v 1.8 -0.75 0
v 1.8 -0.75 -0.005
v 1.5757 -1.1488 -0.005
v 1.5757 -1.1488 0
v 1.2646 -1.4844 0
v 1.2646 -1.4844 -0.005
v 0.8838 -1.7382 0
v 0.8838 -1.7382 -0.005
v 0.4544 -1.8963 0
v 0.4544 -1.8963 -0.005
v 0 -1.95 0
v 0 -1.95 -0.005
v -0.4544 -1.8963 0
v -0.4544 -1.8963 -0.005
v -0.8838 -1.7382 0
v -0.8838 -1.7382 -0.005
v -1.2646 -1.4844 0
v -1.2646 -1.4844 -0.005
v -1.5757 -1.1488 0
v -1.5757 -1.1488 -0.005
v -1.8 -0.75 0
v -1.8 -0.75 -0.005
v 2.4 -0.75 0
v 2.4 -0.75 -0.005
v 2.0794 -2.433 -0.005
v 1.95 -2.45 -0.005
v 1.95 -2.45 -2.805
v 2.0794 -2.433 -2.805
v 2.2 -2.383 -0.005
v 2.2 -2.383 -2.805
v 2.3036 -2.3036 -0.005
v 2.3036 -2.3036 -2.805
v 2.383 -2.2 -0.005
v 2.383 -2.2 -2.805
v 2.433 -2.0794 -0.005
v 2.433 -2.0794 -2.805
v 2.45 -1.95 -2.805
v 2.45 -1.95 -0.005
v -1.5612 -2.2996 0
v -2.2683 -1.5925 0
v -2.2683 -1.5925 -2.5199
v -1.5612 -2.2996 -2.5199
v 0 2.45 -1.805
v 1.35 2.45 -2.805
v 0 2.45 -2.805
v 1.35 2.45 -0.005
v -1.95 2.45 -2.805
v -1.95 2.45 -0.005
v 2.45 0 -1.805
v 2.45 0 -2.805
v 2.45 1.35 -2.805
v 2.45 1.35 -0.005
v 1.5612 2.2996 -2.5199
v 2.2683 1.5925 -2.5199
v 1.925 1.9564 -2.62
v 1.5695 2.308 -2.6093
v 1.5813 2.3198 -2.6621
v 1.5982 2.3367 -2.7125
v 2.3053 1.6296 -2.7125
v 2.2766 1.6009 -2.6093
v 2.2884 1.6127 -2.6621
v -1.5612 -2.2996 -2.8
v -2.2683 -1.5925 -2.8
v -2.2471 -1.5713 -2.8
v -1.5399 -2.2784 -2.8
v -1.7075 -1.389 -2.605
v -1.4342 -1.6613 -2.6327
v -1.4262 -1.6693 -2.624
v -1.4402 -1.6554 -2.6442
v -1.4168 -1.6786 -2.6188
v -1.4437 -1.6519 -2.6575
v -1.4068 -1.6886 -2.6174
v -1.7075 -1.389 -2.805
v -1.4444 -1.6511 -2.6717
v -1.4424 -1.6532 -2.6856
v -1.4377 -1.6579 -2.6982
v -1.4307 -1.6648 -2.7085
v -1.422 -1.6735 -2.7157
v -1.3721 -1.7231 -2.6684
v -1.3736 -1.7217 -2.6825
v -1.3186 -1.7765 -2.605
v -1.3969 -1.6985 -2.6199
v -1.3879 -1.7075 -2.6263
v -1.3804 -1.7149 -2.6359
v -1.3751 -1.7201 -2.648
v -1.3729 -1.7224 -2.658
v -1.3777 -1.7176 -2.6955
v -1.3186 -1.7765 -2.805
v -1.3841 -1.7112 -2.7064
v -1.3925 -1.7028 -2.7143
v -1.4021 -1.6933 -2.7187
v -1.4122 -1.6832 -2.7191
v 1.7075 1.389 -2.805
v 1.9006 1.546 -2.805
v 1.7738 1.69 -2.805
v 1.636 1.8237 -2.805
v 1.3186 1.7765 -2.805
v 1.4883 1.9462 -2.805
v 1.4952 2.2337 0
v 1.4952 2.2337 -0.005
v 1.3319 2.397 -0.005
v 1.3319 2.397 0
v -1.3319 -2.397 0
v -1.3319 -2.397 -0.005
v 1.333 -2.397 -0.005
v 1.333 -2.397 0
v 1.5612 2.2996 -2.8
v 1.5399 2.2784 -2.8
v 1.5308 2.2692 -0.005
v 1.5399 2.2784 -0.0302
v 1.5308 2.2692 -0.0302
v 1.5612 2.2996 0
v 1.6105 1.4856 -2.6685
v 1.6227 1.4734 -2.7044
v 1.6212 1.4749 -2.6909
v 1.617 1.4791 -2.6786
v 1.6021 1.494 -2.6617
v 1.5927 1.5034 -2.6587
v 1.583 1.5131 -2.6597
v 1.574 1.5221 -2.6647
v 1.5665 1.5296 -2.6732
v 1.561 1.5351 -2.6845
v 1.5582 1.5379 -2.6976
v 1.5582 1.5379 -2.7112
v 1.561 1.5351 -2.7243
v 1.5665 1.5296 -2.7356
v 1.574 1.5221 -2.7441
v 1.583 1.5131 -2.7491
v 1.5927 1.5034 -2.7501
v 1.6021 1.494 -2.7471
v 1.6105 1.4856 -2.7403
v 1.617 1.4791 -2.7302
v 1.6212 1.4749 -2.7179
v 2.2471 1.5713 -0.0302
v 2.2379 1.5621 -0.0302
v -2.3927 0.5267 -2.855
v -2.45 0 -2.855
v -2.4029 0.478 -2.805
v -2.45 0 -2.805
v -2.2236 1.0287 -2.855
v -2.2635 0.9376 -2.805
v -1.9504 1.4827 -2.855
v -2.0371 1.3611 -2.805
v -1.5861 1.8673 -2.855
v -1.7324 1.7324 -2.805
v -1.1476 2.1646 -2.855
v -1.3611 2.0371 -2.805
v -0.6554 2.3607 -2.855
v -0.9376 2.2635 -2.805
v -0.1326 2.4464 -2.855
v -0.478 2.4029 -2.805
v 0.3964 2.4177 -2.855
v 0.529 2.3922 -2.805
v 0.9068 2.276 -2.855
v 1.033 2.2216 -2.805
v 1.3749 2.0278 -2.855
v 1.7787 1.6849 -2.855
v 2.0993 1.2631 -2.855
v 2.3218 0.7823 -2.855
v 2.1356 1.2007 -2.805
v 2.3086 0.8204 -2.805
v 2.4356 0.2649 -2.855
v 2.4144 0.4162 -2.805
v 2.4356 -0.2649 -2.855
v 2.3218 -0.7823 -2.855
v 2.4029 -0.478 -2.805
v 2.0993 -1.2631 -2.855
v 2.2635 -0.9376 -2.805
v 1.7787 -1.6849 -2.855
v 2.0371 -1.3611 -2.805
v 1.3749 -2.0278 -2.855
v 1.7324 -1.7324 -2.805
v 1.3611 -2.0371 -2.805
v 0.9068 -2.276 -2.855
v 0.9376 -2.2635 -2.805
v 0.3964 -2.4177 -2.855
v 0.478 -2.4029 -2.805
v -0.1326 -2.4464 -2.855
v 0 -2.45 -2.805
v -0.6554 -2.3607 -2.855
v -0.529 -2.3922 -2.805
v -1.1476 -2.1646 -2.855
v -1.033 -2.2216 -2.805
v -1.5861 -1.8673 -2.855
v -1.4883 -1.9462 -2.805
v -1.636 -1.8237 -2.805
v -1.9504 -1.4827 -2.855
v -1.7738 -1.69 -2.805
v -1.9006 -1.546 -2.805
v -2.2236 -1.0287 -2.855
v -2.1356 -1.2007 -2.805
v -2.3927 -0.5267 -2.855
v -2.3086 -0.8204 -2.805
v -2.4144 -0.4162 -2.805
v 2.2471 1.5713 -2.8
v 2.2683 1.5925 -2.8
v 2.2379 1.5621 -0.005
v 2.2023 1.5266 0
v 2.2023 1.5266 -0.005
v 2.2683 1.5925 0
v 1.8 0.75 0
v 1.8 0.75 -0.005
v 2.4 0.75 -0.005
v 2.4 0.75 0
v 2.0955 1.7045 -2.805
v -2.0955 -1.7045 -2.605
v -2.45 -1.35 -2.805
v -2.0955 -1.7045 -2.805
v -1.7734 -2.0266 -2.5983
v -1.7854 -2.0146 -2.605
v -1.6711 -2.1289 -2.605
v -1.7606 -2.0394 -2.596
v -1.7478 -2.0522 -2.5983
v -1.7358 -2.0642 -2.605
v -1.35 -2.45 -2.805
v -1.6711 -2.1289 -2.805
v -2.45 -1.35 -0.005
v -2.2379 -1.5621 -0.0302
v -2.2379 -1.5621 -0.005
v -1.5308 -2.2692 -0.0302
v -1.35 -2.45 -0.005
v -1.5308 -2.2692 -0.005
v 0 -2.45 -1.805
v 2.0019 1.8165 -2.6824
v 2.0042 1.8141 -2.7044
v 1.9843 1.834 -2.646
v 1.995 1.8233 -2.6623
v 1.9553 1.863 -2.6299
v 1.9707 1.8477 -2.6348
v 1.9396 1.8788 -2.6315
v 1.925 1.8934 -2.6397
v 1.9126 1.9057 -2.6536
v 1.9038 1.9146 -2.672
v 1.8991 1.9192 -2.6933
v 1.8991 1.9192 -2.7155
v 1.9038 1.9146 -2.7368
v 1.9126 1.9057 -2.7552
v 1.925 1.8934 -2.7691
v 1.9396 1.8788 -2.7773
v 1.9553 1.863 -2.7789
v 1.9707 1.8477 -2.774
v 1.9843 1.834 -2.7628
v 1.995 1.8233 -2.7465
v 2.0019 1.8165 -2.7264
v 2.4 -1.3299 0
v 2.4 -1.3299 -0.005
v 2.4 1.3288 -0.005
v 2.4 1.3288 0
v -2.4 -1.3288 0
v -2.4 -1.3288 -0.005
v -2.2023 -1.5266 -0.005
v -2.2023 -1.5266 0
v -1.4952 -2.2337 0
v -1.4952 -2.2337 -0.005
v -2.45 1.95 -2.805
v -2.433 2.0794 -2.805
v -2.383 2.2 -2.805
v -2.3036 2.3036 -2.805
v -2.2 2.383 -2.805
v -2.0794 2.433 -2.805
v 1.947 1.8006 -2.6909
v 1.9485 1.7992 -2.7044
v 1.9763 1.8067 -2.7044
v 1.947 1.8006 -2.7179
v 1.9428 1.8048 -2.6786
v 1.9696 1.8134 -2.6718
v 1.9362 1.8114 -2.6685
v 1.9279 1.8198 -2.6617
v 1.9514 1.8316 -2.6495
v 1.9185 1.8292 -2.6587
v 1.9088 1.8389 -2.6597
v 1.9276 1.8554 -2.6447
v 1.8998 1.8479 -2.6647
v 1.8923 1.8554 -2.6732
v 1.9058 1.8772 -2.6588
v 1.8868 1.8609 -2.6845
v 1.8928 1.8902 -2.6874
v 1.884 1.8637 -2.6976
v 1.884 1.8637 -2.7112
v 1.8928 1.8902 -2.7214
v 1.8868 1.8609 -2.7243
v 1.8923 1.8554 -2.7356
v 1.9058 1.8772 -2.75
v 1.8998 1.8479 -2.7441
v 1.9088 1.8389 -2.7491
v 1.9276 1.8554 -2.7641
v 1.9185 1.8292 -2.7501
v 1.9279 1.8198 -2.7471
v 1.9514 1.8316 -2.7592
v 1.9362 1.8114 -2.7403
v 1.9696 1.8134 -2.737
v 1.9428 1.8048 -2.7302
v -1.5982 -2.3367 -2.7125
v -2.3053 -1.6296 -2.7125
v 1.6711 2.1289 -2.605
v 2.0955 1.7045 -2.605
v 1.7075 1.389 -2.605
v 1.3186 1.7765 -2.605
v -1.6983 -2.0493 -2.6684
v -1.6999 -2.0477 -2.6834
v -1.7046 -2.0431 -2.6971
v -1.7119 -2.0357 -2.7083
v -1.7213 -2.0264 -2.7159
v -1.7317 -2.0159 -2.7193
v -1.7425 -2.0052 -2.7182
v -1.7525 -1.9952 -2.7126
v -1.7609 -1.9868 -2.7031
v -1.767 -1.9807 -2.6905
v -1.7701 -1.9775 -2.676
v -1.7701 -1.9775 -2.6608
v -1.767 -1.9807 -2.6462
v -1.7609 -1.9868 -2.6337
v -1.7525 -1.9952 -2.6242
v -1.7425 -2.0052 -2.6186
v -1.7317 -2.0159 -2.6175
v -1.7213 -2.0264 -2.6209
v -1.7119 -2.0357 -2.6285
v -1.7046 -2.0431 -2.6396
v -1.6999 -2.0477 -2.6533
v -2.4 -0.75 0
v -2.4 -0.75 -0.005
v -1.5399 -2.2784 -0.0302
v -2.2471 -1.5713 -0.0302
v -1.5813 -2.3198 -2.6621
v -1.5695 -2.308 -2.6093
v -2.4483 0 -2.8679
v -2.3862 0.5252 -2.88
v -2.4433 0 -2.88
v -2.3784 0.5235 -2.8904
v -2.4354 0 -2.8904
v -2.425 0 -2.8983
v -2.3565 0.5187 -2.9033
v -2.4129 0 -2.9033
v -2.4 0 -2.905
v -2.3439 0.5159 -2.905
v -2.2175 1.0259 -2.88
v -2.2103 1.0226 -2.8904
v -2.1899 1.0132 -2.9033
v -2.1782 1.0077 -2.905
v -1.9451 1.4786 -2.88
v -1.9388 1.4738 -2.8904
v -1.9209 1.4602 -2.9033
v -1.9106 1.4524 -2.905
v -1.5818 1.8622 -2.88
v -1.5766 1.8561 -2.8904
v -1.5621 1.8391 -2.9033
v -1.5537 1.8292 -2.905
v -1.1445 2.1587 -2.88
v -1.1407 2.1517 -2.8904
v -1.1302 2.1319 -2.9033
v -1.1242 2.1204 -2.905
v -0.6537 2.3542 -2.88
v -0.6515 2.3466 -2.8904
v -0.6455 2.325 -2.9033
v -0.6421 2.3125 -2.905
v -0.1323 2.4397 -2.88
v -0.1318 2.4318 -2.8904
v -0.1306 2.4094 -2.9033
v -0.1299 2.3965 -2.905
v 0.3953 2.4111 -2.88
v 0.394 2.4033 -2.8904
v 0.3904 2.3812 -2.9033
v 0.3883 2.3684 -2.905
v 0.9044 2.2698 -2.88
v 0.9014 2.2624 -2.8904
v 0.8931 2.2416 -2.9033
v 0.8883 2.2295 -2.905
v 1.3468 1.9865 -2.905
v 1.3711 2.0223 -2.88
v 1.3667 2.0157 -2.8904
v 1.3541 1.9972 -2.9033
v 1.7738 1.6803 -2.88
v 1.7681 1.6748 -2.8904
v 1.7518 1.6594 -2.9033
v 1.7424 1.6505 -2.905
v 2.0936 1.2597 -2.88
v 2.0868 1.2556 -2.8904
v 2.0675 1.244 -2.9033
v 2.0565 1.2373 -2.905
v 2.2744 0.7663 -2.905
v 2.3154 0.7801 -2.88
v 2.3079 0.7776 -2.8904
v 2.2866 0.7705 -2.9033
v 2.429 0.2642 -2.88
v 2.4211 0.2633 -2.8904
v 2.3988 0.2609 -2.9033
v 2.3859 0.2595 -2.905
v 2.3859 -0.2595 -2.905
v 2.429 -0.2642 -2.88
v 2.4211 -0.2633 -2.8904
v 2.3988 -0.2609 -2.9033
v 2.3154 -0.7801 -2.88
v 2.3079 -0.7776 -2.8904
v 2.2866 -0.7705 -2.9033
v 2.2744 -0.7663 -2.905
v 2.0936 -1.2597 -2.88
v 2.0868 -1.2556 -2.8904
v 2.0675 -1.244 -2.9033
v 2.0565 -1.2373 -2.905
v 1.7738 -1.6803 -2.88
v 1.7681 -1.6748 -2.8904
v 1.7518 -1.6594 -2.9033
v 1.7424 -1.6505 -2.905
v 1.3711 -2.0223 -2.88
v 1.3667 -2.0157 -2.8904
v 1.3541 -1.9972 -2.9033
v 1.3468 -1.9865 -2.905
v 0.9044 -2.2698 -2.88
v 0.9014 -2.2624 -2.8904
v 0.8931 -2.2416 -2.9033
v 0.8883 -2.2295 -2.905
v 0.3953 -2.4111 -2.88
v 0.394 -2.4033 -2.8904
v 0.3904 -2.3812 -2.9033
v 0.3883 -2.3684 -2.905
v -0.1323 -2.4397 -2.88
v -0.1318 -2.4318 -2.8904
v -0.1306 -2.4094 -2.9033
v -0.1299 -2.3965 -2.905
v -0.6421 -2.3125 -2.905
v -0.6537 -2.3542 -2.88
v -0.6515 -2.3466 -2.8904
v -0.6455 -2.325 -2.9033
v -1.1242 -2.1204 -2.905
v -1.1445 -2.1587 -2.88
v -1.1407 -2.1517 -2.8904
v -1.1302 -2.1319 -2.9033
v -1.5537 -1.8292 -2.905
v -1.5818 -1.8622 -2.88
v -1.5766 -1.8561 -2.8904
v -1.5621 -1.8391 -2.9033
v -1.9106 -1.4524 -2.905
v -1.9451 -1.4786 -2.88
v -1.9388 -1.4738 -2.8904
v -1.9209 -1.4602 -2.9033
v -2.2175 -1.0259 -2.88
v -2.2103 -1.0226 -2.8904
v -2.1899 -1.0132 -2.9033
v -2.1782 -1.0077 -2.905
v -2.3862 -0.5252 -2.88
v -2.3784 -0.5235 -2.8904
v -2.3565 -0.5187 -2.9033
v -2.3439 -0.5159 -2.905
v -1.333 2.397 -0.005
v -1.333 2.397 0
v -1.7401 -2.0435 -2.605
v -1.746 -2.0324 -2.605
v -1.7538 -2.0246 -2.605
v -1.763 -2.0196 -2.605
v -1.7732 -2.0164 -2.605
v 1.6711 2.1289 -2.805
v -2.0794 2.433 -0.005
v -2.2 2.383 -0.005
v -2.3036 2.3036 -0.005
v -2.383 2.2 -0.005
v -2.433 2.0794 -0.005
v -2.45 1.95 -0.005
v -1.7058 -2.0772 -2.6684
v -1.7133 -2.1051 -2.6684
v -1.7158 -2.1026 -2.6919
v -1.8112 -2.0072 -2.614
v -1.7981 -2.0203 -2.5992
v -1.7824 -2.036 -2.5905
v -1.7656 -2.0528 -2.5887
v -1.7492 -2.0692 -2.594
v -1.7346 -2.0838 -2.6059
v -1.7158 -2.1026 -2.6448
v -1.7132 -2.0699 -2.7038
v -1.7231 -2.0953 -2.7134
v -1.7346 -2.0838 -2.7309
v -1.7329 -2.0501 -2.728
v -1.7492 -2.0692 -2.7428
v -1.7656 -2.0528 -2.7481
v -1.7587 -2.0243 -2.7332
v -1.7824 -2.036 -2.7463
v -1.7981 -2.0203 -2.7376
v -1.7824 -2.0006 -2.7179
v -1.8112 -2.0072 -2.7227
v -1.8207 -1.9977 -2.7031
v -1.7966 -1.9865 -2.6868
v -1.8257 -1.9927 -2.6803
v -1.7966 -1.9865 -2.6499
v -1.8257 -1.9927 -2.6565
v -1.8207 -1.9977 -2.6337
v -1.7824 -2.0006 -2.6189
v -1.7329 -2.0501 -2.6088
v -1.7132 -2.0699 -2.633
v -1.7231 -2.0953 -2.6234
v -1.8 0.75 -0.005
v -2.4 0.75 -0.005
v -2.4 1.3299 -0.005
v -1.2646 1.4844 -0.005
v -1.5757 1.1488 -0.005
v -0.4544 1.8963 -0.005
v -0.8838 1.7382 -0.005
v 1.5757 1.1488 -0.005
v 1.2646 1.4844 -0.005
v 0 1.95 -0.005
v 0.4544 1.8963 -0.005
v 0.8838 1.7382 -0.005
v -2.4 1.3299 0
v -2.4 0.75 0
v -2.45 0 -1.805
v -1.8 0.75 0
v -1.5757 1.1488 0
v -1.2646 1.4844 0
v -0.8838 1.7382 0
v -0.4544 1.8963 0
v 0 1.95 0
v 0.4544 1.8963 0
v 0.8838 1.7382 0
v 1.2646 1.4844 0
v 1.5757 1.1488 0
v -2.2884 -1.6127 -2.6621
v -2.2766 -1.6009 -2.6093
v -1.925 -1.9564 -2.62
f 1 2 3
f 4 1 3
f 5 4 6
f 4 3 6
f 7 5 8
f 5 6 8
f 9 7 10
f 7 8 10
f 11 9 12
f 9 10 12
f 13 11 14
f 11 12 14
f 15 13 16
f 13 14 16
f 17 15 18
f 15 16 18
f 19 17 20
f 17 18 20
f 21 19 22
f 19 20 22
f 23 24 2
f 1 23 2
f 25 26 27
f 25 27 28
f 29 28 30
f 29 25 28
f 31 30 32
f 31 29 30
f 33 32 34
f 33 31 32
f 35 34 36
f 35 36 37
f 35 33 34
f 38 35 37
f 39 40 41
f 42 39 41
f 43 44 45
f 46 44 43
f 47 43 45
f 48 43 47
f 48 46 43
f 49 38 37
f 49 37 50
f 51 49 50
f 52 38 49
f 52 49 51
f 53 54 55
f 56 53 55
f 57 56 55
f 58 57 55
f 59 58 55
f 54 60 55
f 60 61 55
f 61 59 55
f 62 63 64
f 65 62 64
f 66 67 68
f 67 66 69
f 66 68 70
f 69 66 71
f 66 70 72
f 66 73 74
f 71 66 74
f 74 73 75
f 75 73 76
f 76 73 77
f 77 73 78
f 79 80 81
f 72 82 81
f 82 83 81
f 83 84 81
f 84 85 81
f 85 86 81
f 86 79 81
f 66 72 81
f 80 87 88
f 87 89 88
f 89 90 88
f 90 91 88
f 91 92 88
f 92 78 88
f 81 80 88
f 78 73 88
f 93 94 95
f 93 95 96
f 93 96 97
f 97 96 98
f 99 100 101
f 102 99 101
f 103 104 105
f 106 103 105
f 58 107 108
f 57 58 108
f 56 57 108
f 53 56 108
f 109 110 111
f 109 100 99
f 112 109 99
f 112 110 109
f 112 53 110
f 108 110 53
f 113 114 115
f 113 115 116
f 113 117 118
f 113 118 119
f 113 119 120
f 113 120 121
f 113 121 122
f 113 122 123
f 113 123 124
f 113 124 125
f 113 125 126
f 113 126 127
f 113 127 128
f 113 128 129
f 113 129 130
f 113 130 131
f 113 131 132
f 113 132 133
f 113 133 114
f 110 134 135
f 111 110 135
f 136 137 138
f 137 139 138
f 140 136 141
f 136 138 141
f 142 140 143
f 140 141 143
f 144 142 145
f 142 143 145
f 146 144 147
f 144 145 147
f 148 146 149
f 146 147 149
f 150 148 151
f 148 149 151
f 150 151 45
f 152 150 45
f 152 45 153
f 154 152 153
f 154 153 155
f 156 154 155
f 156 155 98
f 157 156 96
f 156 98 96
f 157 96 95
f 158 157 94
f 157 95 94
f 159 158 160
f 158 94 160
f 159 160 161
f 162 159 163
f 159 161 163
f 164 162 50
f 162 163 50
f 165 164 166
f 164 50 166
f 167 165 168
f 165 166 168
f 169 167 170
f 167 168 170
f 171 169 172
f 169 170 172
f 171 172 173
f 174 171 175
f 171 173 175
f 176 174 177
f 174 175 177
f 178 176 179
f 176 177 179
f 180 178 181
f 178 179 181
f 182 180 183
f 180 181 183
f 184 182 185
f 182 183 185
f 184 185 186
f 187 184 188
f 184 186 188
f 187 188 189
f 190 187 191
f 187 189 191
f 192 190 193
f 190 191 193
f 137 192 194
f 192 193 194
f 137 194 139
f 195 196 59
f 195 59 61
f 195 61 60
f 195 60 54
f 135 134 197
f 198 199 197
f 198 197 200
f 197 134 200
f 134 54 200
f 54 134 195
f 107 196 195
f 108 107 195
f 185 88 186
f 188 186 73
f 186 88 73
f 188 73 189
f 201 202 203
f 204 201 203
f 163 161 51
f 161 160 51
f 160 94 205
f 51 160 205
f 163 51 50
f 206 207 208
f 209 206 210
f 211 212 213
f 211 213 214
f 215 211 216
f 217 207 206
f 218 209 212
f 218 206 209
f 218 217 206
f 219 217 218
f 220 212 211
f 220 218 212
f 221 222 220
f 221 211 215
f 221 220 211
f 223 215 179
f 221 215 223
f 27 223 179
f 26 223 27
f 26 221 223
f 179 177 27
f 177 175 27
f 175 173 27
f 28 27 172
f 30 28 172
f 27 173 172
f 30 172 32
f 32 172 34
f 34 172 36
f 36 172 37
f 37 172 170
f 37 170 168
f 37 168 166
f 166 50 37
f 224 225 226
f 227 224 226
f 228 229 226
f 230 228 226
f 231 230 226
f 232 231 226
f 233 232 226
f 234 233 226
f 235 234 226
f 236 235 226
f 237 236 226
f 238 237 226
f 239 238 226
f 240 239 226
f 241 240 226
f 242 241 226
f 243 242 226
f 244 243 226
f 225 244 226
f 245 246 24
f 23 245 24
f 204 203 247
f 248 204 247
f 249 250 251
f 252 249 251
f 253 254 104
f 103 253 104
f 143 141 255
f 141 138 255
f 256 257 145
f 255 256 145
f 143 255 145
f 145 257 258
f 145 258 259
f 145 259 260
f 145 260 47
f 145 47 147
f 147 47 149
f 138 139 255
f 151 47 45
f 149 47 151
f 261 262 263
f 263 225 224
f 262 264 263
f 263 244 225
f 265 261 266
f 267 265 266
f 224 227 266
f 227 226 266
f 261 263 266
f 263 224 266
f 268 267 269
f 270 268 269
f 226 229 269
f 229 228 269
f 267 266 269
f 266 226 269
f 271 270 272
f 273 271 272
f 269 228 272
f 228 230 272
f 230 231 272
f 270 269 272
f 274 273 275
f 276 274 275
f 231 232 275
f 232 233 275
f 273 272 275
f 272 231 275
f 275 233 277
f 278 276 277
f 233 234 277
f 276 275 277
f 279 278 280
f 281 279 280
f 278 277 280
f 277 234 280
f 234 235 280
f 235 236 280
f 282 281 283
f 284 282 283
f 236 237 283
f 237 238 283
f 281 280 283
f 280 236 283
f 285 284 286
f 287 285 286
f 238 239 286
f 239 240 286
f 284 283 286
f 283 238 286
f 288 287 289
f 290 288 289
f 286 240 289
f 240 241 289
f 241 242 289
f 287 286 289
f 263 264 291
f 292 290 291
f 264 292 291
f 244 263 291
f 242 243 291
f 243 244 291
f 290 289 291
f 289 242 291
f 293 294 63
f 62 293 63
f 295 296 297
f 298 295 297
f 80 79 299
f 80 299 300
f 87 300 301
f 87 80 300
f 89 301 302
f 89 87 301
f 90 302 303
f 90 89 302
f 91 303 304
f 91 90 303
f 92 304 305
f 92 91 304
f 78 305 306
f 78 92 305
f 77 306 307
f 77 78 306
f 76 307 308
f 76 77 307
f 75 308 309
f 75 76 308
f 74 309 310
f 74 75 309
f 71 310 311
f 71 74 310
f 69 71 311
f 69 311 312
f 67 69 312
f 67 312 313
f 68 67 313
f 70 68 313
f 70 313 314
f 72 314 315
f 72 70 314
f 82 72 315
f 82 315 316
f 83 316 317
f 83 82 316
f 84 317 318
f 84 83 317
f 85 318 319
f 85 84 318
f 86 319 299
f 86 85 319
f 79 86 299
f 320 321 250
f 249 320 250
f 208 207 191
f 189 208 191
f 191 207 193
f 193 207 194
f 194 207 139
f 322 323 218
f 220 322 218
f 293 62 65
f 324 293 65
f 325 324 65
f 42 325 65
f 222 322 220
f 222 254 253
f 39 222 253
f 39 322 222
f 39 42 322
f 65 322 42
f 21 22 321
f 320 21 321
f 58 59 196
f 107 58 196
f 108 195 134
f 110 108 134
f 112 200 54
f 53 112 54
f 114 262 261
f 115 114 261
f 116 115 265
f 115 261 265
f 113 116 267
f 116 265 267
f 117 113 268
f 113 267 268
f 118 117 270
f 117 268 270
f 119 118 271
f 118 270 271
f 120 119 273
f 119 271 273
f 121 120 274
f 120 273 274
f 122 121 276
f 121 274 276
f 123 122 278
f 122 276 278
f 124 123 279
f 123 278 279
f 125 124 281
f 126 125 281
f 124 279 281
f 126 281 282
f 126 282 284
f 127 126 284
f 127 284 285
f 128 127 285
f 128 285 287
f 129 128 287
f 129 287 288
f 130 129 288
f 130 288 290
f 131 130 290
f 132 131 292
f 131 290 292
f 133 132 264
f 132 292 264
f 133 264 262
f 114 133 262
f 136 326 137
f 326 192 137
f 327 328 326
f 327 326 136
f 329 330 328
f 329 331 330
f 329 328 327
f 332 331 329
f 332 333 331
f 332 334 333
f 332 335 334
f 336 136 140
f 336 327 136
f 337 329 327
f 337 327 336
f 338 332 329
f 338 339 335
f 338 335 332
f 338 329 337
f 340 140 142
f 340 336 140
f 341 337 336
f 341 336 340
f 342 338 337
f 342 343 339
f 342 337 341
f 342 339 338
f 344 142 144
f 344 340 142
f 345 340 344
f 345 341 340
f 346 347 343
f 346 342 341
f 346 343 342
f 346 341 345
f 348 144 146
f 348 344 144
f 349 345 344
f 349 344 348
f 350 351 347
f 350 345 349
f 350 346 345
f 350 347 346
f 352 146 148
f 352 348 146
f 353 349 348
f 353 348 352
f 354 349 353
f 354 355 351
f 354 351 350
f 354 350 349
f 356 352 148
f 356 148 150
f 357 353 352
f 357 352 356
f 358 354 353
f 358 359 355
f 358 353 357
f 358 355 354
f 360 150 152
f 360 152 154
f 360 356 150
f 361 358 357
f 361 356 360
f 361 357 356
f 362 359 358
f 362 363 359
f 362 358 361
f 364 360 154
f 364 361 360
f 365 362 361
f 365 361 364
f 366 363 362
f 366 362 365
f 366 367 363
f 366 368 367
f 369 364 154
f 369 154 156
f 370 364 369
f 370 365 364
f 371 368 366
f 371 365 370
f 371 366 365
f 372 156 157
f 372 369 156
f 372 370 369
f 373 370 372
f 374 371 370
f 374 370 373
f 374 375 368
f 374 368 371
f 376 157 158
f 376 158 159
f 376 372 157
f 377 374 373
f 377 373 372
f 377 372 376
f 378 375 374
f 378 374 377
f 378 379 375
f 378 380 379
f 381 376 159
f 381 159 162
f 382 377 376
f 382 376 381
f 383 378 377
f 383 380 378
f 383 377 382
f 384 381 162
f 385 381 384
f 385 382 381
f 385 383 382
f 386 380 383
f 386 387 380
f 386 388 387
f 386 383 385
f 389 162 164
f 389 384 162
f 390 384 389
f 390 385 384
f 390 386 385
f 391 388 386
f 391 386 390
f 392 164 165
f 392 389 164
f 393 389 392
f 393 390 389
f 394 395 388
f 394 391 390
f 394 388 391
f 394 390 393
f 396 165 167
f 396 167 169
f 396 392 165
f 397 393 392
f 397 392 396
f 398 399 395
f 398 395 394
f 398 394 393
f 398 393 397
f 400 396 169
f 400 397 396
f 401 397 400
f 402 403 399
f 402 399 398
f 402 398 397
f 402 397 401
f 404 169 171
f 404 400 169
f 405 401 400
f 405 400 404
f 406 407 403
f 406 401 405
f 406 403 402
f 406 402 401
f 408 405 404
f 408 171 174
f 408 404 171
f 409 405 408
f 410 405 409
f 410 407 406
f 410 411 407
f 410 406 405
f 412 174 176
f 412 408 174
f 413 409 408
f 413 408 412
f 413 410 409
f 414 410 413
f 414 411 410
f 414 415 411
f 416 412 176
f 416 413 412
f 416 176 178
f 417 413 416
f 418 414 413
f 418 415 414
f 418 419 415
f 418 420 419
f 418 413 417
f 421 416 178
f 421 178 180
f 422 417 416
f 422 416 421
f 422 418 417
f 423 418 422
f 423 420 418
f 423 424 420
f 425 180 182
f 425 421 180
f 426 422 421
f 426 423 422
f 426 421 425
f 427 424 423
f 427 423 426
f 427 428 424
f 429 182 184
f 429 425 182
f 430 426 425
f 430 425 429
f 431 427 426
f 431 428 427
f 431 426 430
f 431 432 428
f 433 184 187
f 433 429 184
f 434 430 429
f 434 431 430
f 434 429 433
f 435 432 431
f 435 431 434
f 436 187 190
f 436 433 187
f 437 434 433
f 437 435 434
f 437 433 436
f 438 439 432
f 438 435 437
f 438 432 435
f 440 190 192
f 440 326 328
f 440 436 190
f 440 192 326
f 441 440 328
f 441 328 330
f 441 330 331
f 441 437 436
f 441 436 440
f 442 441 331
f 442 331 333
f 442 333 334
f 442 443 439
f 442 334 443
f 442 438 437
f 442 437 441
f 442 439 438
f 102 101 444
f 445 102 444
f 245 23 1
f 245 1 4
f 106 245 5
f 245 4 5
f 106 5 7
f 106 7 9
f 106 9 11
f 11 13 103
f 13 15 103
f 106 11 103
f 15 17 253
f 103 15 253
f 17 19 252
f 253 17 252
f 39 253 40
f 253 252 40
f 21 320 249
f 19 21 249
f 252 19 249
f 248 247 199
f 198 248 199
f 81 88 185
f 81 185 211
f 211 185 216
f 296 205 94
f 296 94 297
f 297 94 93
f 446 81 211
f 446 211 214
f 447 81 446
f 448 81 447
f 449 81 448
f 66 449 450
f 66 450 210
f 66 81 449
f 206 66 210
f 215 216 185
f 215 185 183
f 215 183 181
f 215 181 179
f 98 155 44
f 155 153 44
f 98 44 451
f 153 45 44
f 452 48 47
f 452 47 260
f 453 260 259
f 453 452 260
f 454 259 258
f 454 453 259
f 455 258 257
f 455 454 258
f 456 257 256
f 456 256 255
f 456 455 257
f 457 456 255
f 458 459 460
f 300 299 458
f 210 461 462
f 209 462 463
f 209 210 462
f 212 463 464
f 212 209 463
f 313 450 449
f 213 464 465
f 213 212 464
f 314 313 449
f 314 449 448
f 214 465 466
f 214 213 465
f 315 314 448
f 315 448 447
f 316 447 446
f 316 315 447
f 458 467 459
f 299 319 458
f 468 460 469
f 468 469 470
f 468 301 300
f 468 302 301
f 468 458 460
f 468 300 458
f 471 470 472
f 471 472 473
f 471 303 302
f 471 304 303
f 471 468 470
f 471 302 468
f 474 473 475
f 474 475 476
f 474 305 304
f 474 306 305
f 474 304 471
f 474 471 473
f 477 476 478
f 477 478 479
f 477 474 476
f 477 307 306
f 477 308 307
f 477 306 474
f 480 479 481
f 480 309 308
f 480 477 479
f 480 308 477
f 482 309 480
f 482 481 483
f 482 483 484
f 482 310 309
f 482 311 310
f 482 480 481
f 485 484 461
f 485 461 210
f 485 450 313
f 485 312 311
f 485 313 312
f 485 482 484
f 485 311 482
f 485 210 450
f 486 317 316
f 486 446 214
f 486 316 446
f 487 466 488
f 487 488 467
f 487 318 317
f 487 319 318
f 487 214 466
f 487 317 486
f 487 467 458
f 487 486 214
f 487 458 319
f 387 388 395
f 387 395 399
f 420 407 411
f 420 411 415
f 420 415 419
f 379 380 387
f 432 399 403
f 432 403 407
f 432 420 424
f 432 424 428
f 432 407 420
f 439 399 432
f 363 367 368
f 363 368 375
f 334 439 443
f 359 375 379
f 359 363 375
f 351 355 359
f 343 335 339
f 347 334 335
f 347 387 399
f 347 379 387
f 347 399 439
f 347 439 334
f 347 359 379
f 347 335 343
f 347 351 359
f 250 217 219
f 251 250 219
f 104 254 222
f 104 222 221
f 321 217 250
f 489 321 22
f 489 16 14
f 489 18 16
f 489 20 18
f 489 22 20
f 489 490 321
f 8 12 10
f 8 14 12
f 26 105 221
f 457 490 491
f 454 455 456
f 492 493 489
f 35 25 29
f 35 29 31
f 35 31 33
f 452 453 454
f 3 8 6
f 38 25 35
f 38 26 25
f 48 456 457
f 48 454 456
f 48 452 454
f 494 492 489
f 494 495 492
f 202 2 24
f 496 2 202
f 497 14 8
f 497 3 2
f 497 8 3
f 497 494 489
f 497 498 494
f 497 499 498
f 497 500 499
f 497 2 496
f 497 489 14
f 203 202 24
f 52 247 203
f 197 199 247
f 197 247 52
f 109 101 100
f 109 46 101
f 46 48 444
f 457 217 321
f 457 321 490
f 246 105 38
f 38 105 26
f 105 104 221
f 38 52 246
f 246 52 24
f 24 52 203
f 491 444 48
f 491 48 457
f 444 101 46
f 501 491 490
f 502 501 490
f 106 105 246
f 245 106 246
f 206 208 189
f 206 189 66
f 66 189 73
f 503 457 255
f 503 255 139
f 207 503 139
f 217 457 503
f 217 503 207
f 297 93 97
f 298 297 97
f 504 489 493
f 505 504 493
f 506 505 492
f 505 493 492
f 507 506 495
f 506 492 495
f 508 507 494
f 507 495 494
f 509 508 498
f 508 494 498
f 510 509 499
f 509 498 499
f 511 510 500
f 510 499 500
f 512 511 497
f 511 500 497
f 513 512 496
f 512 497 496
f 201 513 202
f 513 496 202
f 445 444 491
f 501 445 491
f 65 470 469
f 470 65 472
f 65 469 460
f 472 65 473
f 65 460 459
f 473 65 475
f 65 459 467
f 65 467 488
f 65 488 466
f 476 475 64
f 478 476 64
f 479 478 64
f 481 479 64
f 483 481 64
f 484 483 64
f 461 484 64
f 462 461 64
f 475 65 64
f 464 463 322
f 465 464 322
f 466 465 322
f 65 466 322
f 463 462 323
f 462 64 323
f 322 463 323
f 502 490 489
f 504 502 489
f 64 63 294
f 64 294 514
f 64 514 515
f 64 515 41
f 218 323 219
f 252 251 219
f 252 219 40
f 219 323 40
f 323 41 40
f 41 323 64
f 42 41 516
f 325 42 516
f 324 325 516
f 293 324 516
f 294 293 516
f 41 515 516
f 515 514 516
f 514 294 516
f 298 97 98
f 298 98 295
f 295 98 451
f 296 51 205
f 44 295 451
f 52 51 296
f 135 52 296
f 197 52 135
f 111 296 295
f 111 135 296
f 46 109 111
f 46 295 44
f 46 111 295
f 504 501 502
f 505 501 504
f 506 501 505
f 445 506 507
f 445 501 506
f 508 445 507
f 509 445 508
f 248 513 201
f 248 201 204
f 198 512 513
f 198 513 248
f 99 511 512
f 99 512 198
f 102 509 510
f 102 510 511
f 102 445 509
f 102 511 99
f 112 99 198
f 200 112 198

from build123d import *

# Parameters (mm, degrees)
EXTRUDE_START             = -0.005
EXTRUDE_1_DEPTH           = 2.8
EXTRUDE_2_DEPTH           = 0.1
EXTRUDE_2_DEPTH_BACK      = 1
SKETCH_2_R                = 2.45
FILLET_1_R                = 0.05
EXTRUDE_START_2           = 0.3
EXTRUDE_6_DEPTH           = 1
CUT_EXTRUDE_8_DEPTH       = 0.2
EXTRUDE_START_3           = 0.05
SKETCH_9_R                = 0.045863928
EXTRUDE_9_DEPTH           = 0.460735
EXTRUDE_9_OTHER_WAY_DEPTH = 0.05
EXTRUDE_9_OTHER_WAY_TAPER = -30
PATTERN_CIRCULAR_3_COUNT  = 2
EXTRUDE_12_DEPTH          = 0.005


# Read off the part's stored shape, not the designer's step: Вытянуть11
with BuildPart() as part:
    # Эскиз1 → Вытянуть1 (new body)
    with BuildSketch(Plane.XY.offset(EXTRUDE_START)):
        with BuildLine():
            Line((-2.45, -1.35), (-1.35, -2.45))
            Line((-1.35, -2.45), (1.95, -2.45))
            ThreePointArc((1.95, -2.45), (2.303553391, -2.303553391), (2.45, -1.95))
            Line((2.45, -1.95), (2.45, 1.35))
            Line((2.45, 1.35), (1.35, 2.45))
            Line((1.35, 2.45), (-1.95, 2.45))
            ThreePointArc((-1.95, 2.45), (-2.303553391, 2.303553391), (-2.45, 1.95))
            Line((-2.45, 1.95), (-2.45, -1.35))
        make_face()
    extrude(amount=-EXTRUDE_1_DEPTH)

    # Эскиз2 → Вытянуть2 (add, two sides: drawn at the far end of the back side and taken through both)
    with BuildSketch(Plane(origin=(0, 0, -2.805), x_dir=(-1, 0, 0), z_dir=(0, 0, -1)).offset(-EXTRUDE_2_DEPTH_BACK)):
        Circle(SKETCH_2_R)
    extrude(amount=EXTRUDE_2_DEPTH + EXTRUDE_2_DEPTH_BACK)

    # Скругление1
    fillet_1_edges = [part.edges().sort_by_distance(p)[0] for p in [
        (2.45, 0, -2.905),
    ]]
    fillet(fillet_1_edges, radius=FILLET_1_R)

    # Эскиз6 → Вытянуть6 (add)
    with BuildSketch(Plane(origin=(0.55, -0.55, 0), x_dir=(0, 0, 1), z_dir=(-0.7071067811865498, 0.7071067811865452, 0)).offset(EXTRUDE_START_2)):
        with BuildLine():
            Line((-2.712480612, 2.782369178), (-2.8, 2.73))
            Line((-2.8, 2.73), (-2.8, 2.7))
            Line((-2.8, 2.7), (-0.030179797, 2.7))
            Line((-0.030179797, 2.7), (-0.030179797, 2.2))
            Line((-0.030179797, 2.2), (0, 2.2))
            Line((0, 2.2), (0, 2.73))
            Line((0, 2.73), (-2.519857711, 2.73))
            add(Edge.make_bspline(
                [(-2.519857711, 2.73), (-2.623929678, 2.733012128), (-2.712480612, 2.782369178)],
                knots=[0, 0, 0, 1, 1, 1], degree=2))
        make_face()
    extrude_6 = extrude(amount=EXTRUDE_6_DEPTH)

    # Эскиз8 → Вытянуть8 (cut)
    with BuildSketch(Plane(origin=(0, 0, -2.805), x_dir=(-1, 0, 0), z_dir=(0, 0, -1))):
        Polygon((-1.67106601, 2.12893399), (-2.095468281, 1.704531719), (-1.707545088, 1.388980588), (-1.318603045, 1.776471025), align=None)
        Polygon((2.095468281, -1.704531719), (1.707545088, -1.388980588), (1.318603045, -1.776471025), (1.67106601, -2.12893399), align=None)
    extrude(amount=-CUT_EXTRUDE_8_DEPTH, mode=Mode.SUBTRACT)

    # Круговой массив3: Вытянуть6 ×2 about axis
    pattern_circular_3_axis = Axis((0, 0, -2.905), (0, 0, 1))
    for i in range(1, PATTERN_CIRCULAR_3_COUNT):
        add(extrude_6.rotate(pattern_circular_3_axis, i * 360 / PATTERN_CIRCULAR_3_COUNT))

    # Вытянуть11 outline → Вытянуть11 (revolve)
    with BuildSketch(Plane(origin=(0.139390265, -0.139390265, -2.66838383), x_dir=(0.7071067811865551, -0.70710678118654, 0), z_dir=(0, 0, 1))):
        Polygon((0, -2.7), (0.079921408, -2.7), (0.051053894, -2.65), (0.051053895, -2.18868786), (0, -2.18868786), align=None)
    revolve(axis=Axis((0.139390265, -0.139390265, -2.66838383), (0.70710678118654, 0.7071067811865551, 0)))

    # Эскиз13 → Вытянуть12 (add)
    with BuildSketch(Plane.XY.offset(-0.005)):
        with BuildLine():
            Line((-2.4, 1.329947834), (-2.4, 0.75))
            Line((-2.4, 0.75), (-1.8, 0.75))
            ThreePointArc((-1.8, 0.75), (0, 1.95), (1.8, 0.75))
            Line((1.8, 0.75), (2.4, 0.75))
            Line((2.4, 0.75), (2.4, 1.328848765))
            Line((2.4, 1.328848765), (1.331878419, 2.396970346))
            Line((1.331878419, 2.396970346), (-1.332977488, 2.396970346))
            Line((-1.332977488, 2.396970346), (-2.4, 1.329947834))
        make_face()
        with BuildLine():
            Line((2.4, -1.329947834), (2.4, -0.75))
            Line((2.4, -0.75), (1.8, -0.75))
            ThreePointArc((1.8, -0.75), (0, -1.95), (-1.8, -0.75))
            Line((-1.8, -0.75), (-2.4, -0.75))
            Line((-2.4, -0.75), (-2.4, -1.328848765))
            Line((-2.4, -1.328848765), (-1.331878419, -2.396970346))
            Line((-1.331878419, -2.396970346), (1.332977488, -2.396970346))
            Line((1.332977488, -2.396970346), (2.4, -1.329947834))
        make_face()
    extrude(amount=EXTRUDE_12_DEPTH)


with BuildPart() as body_2:
    # Эскиз9 → Вытянуть9 (new body)
    with BuildSketch(Plane(origin=(1.909188309, 1.909188309, 0), x_dir=(0, 0, 1), z_dir=(-0.7071067811865452, -0.7071067811865498, 0)).offset(EXTRUDE_START_3)):
        with Locations(Location((-2.704395886, -0.059674036, 0), (0, 0, 270))):
            Circle(SKETCH_9_R)
    extrude(amount=EXTRUDE_9_DEPTH)

    # Эскиз9 → Вытянуть9 other way (add)
    with BuildSketch(Plane(origin=(1.909188309, 1.909188309, 0), x_dir=(0, 0, 1), z_dir=(-0.7071067811865452, -0.7071067811865498, 0)).offset(EXTRUDE_START_3)):
        with Locations(Location((-2.704395886, -0.059674036, 0), (0, 0, 270))):
            Circle(SKETCH_9_R)
    extrude(amount=-EXTRUDE_9_OTHER_WAY_DEPTH, taper=EXTRUDE_9_OTHER_WAY_TAPER)


solid = Compound([part.part, body_2.part])
